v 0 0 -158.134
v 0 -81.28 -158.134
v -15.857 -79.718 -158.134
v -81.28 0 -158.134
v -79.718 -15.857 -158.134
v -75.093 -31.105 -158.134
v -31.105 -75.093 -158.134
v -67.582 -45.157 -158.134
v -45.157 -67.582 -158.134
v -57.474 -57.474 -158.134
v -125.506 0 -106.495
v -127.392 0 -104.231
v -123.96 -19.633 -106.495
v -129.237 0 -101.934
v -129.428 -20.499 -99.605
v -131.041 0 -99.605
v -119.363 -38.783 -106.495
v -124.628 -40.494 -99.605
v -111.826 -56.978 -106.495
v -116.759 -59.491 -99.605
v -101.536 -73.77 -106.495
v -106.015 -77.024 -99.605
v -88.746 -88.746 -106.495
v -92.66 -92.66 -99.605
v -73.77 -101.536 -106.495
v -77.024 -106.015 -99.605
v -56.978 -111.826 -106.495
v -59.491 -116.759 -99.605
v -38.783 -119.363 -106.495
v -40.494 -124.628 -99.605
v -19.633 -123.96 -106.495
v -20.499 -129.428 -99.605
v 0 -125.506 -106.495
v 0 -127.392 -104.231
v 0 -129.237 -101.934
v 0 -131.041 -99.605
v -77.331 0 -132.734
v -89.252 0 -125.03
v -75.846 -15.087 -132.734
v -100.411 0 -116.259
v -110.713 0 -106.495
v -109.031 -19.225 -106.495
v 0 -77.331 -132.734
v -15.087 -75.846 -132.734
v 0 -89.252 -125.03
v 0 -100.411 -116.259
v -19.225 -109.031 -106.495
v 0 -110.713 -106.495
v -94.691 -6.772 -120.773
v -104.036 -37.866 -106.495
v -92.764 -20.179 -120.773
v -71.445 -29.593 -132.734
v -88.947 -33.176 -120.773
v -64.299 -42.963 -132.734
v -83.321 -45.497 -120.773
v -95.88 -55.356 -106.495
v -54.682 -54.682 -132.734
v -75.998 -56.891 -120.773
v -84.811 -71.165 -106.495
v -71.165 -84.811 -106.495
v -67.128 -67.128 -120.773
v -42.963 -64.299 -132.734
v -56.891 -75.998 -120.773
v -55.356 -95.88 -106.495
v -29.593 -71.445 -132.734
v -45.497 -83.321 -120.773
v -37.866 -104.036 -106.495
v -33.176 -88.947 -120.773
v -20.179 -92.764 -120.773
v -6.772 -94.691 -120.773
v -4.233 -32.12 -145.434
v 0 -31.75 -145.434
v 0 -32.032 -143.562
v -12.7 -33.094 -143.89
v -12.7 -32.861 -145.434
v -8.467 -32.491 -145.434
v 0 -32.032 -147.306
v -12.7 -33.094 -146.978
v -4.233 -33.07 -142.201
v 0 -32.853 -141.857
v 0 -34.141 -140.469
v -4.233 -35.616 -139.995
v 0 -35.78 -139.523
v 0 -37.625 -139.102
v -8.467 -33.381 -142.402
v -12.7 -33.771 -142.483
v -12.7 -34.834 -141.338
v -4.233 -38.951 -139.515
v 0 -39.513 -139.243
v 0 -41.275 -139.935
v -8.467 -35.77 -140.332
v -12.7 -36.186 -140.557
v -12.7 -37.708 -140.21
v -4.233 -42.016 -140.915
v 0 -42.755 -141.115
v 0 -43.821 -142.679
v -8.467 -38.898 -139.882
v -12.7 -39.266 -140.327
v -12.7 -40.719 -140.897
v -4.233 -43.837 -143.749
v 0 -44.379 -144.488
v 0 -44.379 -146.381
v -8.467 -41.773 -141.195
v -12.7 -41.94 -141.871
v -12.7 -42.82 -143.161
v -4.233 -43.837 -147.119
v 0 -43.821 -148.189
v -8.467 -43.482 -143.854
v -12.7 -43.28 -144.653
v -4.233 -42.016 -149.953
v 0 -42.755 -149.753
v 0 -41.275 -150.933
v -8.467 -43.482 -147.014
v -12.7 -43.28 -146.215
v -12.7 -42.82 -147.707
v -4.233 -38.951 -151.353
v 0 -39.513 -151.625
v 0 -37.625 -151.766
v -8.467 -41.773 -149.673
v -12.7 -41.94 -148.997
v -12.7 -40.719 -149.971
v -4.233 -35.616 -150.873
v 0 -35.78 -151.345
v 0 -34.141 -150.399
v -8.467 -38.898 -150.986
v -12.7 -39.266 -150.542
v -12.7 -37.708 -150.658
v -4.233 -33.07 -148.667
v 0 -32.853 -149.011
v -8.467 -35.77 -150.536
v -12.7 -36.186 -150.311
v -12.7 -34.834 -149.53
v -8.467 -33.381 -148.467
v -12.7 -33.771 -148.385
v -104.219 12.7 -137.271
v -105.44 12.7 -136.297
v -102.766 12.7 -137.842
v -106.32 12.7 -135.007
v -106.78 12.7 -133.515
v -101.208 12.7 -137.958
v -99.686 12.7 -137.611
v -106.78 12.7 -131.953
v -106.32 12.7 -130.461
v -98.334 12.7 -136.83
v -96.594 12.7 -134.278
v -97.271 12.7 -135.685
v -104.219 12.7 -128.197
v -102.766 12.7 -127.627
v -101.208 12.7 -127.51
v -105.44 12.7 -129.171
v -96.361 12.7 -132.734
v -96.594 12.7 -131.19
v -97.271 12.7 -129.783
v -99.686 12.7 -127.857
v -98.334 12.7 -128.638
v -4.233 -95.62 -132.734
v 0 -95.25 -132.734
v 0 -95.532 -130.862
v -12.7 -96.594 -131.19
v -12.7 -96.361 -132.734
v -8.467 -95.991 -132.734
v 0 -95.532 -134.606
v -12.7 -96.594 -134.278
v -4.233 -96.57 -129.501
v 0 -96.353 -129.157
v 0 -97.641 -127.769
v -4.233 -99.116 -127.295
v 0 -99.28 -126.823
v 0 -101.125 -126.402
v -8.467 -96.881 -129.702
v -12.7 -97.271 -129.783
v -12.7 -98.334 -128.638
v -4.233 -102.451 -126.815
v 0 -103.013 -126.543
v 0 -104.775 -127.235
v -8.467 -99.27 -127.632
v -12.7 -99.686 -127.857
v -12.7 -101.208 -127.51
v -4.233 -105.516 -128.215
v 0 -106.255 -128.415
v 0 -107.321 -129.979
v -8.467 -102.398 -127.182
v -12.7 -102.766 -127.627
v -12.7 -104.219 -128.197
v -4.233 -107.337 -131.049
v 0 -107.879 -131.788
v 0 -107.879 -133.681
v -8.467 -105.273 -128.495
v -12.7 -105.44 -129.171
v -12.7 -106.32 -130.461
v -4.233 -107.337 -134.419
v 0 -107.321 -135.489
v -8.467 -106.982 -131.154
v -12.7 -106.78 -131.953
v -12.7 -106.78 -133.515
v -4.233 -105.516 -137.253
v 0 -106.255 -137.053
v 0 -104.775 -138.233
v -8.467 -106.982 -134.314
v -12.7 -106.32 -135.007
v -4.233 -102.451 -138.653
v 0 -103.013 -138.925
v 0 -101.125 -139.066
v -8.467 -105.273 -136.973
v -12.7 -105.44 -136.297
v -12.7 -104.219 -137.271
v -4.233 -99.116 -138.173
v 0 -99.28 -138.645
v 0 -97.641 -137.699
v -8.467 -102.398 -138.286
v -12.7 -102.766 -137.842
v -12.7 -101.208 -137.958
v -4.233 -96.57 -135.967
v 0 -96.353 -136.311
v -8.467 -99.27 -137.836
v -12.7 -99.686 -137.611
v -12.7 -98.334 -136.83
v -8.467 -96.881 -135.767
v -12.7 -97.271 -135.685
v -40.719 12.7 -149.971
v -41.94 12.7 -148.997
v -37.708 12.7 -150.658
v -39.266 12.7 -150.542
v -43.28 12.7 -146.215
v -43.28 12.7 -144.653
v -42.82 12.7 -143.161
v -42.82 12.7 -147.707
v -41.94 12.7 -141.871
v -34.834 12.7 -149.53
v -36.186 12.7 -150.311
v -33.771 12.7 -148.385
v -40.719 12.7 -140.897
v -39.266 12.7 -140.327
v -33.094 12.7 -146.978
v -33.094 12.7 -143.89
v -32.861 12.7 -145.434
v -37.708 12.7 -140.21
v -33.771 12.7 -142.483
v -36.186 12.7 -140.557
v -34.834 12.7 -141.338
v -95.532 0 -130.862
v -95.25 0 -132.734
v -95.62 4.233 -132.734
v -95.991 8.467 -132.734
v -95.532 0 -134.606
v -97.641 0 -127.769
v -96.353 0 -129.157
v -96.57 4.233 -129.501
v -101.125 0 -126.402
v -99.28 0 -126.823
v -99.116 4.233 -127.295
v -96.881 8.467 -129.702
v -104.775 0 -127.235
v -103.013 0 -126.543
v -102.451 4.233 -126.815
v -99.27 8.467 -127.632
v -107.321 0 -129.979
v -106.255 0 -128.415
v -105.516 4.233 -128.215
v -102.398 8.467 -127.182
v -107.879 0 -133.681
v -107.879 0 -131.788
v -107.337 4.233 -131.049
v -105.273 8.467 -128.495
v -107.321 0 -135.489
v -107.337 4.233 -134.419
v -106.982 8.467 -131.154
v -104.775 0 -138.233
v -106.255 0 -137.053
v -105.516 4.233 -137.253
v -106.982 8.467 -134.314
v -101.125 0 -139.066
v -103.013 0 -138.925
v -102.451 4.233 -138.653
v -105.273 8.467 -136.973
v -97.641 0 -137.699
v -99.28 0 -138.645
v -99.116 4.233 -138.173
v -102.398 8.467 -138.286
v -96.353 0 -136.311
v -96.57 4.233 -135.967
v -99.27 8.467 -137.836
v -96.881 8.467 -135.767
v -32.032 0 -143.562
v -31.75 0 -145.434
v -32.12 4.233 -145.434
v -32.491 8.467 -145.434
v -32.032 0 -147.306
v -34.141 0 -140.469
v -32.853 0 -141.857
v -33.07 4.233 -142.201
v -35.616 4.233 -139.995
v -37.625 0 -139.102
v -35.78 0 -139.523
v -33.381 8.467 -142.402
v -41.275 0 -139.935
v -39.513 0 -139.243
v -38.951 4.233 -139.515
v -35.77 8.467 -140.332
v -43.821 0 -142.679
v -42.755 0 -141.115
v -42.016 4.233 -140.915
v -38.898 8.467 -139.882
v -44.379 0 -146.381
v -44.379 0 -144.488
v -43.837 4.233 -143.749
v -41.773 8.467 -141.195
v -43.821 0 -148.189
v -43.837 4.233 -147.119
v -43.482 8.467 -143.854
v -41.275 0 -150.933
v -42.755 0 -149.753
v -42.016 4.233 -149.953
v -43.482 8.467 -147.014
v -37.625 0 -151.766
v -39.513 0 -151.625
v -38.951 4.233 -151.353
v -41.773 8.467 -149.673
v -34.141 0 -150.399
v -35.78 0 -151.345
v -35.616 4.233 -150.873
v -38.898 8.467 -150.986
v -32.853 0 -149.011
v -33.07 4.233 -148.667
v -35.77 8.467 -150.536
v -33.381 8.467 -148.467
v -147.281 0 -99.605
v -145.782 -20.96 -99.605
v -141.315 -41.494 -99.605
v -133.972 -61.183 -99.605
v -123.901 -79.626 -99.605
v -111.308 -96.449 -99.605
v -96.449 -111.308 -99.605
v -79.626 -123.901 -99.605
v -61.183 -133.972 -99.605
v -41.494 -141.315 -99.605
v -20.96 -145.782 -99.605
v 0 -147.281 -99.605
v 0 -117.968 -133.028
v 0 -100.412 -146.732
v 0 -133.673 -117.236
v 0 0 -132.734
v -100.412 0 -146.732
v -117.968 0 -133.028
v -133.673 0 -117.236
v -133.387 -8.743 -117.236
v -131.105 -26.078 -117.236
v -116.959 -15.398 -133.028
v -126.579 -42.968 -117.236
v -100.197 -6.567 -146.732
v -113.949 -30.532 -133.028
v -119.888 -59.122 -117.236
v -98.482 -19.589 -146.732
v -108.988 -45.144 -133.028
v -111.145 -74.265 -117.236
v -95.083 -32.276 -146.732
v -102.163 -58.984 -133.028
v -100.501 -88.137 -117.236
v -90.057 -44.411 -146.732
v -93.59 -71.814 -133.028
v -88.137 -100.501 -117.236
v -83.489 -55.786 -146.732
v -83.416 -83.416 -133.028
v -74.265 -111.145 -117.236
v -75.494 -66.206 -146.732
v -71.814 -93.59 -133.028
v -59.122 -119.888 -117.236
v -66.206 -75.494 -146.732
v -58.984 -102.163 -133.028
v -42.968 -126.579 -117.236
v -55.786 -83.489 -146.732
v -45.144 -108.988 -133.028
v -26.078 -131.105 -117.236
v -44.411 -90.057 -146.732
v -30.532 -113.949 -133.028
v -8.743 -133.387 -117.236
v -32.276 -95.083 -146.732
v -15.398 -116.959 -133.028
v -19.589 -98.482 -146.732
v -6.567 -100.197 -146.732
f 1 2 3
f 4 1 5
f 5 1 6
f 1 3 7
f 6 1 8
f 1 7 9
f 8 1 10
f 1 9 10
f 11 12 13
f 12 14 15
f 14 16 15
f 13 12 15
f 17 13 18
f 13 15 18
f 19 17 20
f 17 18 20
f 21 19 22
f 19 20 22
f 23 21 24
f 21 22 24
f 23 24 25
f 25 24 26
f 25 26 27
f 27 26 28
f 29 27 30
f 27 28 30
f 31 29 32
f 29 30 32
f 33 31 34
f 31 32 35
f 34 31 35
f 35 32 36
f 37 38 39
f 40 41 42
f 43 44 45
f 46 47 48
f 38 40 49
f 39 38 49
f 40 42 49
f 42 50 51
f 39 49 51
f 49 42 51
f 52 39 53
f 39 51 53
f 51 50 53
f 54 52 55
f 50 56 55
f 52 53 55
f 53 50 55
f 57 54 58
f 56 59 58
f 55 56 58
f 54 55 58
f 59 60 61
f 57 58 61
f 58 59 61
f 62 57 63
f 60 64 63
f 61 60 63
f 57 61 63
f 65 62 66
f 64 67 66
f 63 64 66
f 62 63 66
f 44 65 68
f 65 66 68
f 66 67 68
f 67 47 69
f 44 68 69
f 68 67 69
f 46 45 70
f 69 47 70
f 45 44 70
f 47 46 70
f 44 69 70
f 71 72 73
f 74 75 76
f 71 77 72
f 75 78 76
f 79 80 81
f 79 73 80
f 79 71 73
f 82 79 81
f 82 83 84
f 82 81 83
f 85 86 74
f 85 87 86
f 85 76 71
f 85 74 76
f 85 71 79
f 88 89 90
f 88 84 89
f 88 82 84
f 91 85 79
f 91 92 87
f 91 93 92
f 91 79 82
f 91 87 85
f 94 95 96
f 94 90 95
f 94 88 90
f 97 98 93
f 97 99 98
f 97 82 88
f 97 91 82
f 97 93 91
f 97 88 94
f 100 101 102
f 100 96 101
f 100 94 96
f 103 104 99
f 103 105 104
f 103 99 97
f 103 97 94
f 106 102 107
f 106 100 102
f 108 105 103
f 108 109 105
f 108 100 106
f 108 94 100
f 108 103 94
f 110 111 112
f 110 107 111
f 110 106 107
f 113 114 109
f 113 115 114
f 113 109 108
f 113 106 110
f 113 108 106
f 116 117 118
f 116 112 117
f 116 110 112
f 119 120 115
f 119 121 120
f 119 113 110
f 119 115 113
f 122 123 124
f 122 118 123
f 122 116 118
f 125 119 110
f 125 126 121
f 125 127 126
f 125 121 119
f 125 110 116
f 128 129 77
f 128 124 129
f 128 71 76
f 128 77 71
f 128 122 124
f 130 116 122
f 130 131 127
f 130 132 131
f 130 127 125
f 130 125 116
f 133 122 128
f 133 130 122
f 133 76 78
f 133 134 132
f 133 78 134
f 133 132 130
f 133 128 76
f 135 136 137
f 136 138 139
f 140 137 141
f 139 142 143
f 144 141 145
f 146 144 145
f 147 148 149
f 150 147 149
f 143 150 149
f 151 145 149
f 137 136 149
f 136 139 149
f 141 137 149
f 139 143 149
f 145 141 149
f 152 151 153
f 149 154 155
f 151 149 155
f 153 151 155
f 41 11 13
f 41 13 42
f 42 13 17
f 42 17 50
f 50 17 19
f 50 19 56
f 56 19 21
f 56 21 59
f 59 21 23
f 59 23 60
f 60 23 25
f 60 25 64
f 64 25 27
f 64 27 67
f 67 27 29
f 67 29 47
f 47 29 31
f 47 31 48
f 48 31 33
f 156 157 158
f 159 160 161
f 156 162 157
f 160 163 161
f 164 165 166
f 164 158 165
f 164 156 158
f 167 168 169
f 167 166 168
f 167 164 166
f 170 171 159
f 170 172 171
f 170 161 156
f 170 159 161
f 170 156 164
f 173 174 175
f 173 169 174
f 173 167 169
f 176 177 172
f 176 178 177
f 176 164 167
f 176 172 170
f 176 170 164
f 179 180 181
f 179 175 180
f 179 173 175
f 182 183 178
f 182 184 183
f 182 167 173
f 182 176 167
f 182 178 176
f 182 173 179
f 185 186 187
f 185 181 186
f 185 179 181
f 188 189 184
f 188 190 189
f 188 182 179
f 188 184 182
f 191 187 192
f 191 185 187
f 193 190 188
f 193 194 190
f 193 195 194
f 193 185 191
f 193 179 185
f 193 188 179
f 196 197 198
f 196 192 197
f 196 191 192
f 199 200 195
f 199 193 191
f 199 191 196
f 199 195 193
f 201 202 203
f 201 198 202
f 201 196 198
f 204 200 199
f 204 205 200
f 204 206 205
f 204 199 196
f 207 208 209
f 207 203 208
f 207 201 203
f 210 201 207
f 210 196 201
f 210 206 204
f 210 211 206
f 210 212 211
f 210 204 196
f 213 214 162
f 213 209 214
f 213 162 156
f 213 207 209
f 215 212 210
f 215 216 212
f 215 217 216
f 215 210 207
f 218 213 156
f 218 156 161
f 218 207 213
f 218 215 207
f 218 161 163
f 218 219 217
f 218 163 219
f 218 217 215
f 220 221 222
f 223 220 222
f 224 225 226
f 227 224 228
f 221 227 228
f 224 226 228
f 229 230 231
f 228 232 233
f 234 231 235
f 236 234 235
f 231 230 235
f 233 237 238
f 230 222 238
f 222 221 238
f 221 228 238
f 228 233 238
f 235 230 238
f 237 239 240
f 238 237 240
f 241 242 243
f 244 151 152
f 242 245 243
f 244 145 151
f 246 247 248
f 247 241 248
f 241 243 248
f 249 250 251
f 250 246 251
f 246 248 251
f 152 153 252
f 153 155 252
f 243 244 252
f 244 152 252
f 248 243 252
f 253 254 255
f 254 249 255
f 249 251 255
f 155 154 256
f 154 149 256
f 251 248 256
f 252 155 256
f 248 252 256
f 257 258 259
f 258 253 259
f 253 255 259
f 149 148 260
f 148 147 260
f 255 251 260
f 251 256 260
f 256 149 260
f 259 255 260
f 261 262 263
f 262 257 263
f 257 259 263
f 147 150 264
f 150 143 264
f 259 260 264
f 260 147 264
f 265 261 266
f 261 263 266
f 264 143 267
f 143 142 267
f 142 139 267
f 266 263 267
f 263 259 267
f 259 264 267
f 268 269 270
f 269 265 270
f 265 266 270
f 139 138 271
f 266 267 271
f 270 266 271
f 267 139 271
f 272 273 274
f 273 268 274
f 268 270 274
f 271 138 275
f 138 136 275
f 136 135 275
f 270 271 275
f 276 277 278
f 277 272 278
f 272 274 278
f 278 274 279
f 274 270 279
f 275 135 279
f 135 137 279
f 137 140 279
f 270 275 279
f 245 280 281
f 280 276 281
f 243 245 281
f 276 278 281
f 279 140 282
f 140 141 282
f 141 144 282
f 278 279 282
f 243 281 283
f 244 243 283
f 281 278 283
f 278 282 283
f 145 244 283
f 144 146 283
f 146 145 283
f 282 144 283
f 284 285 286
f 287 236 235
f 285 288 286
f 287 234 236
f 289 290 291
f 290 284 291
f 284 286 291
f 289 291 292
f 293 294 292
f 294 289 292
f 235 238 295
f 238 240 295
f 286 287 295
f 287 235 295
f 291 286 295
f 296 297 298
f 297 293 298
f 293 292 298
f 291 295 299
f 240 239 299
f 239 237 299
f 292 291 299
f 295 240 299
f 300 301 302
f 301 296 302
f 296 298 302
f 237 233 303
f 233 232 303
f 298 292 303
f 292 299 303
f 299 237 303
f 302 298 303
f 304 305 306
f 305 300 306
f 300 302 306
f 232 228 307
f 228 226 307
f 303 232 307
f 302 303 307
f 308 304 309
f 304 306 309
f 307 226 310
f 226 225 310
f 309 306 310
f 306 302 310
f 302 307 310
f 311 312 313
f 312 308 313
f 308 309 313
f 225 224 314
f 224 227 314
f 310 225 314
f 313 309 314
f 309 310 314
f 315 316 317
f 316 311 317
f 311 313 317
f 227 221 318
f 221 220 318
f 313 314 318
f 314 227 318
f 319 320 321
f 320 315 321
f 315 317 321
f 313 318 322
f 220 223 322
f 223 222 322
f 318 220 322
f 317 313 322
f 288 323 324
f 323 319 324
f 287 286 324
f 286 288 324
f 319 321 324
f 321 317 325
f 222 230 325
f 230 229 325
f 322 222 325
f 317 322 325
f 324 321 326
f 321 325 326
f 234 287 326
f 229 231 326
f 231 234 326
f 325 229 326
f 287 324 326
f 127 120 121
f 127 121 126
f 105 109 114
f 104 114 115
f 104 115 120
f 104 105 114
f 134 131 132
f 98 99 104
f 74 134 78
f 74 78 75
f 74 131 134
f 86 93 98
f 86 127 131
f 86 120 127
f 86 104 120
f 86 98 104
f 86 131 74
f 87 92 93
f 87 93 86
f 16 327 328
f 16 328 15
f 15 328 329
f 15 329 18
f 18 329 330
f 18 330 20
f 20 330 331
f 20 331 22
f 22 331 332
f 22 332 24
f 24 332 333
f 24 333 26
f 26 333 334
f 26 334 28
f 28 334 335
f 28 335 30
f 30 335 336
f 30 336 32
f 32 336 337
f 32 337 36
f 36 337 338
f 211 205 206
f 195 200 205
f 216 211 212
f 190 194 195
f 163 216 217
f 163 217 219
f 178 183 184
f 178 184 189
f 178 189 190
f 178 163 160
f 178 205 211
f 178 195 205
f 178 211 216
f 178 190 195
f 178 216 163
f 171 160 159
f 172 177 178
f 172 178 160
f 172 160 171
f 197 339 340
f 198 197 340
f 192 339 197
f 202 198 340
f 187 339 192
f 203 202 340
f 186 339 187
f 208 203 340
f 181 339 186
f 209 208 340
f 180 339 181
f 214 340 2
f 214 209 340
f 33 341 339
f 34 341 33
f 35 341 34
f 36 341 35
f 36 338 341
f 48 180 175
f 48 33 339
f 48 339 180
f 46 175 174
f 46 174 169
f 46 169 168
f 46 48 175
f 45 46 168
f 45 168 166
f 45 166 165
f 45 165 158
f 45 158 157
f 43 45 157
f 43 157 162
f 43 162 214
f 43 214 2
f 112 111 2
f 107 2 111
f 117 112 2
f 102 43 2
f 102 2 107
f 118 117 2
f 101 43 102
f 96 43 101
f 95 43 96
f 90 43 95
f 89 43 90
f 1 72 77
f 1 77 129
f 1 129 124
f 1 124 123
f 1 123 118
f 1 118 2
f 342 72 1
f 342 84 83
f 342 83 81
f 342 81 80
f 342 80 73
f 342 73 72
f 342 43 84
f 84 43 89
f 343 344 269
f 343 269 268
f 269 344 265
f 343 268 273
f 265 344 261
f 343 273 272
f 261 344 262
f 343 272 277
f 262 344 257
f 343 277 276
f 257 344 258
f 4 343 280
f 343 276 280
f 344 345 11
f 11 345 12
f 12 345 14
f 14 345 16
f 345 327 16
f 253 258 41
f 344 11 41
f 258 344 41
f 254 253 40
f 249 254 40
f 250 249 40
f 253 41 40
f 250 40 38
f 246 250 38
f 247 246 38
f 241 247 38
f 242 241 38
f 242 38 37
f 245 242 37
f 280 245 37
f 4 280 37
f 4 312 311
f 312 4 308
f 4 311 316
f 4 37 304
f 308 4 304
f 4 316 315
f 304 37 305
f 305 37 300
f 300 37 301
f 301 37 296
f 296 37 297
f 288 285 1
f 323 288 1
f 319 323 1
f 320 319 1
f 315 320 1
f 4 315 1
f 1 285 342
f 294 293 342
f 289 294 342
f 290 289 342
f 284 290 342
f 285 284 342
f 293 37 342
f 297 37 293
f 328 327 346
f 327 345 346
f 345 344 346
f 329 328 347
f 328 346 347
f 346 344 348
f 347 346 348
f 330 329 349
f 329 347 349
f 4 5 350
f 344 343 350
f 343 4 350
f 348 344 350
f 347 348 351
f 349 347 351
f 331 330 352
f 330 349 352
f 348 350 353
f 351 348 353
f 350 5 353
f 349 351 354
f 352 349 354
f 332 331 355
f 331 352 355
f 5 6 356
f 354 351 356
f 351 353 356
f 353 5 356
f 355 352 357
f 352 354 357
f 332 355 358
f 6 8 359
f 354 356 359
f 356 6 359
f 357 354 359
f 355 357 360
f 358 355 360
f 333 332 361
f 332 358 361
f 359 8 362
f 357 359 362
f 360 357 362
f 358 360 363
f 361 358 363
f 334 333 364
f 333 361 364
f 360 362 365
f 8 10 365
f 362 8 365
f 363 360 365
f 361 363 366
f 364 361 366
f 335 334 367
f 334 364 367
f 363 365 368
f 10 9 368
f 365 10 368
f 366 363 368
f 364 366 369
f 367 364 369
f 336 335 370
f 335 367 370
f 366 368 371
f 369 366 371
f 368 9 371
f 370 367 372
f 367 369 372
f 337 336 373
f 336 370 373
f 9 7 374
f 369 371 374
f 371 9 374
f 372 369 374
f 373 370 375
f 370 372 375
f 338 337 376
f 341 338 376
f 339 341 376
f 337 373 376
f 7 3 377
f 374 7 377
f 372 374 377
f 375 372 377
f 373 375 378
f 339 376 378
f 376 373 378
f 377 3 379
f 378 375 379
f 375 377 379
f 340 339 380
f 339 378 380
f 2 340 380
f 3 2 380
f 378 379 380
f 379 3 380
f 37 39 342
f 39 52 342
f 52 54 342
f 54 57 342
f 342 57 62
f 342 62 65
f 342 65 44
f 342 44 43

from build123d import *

# Parameters (mm, degrees)
F1_ANGLE = 90
F3_R     = 6.35
F4_DEPTH = 12.7
F4_TAPER = 5
F5_R     = 6.35
F6_DEPTH = 12.7
F6_TAPER = 5


# Not quite as in the source:
# - a feature of the source that left no trace in its solid (it failed there, or was rolled back) is left out


with BuildPart() as f1:
    # F0 (on Front) → F1 (revolve)
    with BuildSketch(Plane.XZ):
        with BuildLine():
            Line((-81.28, -158.1341253493), (0, -158.1341253493))
            Line((0, -158.1341253493), (0, -132.7341253493))
            Line((0, -132.7341253493), (-77.331499878, -132.7341253493))
            ThreePointArc((-77.331499878, -132.7341253493), (-94.9330399433, -120.7734525165), (-110.7127485092, -106.4950525761))
            Line((-110.7127485092, -106.4950525761), (-125.4562139511, -106.4950525761))
            Line((-125.4562139511, -106.4950525761), (-125.5056119373, -106.4950525761))
            ThreePointArc((-125.5056119373, -106.4950525761), (-128.3196475153, -103.0869677141), (-131.041165147, -99.6045575657))
            Line((-131.041165147, -99.6045575657), (-147.2812687077, -99.6045575657))
            ThreePointArc((-147.2812687077, -99.6045575657), (-117.9681777623, -133.0276250839), (-81.28, -158.1341253493))
        make_face()
    revolve(axis=Axis((0, 0, -145.4341253493), (0, 0, 1)), revolution_arc=F1_ANGLE)

    # F3 (on face) → F4 (join)
    with BuildSketch(Plane.XZ):
        with Locations((-101.6, -132.7341253493)):
            Circle(F3_R)
        with Locations((-38.1, -145.4341253493)):
            Circle(F3_R)
    extrude(amount=-F4_DEPTH, taper=F4_TAPER)

    # F5 (on face) → F6 (cut)
    with BuildSketch(Plane.YZ):
        with Locations((-101.6, -132.7341253493)):
            Circle(F5_R)
        with Locations((-38.1, -145.4341253493)):
            Circle(F5_R)
    extrude(amount=-F6_DEPTH, taper=F6_TAPER, mode=Mode.SUBTRACT)


solid = f1.part
